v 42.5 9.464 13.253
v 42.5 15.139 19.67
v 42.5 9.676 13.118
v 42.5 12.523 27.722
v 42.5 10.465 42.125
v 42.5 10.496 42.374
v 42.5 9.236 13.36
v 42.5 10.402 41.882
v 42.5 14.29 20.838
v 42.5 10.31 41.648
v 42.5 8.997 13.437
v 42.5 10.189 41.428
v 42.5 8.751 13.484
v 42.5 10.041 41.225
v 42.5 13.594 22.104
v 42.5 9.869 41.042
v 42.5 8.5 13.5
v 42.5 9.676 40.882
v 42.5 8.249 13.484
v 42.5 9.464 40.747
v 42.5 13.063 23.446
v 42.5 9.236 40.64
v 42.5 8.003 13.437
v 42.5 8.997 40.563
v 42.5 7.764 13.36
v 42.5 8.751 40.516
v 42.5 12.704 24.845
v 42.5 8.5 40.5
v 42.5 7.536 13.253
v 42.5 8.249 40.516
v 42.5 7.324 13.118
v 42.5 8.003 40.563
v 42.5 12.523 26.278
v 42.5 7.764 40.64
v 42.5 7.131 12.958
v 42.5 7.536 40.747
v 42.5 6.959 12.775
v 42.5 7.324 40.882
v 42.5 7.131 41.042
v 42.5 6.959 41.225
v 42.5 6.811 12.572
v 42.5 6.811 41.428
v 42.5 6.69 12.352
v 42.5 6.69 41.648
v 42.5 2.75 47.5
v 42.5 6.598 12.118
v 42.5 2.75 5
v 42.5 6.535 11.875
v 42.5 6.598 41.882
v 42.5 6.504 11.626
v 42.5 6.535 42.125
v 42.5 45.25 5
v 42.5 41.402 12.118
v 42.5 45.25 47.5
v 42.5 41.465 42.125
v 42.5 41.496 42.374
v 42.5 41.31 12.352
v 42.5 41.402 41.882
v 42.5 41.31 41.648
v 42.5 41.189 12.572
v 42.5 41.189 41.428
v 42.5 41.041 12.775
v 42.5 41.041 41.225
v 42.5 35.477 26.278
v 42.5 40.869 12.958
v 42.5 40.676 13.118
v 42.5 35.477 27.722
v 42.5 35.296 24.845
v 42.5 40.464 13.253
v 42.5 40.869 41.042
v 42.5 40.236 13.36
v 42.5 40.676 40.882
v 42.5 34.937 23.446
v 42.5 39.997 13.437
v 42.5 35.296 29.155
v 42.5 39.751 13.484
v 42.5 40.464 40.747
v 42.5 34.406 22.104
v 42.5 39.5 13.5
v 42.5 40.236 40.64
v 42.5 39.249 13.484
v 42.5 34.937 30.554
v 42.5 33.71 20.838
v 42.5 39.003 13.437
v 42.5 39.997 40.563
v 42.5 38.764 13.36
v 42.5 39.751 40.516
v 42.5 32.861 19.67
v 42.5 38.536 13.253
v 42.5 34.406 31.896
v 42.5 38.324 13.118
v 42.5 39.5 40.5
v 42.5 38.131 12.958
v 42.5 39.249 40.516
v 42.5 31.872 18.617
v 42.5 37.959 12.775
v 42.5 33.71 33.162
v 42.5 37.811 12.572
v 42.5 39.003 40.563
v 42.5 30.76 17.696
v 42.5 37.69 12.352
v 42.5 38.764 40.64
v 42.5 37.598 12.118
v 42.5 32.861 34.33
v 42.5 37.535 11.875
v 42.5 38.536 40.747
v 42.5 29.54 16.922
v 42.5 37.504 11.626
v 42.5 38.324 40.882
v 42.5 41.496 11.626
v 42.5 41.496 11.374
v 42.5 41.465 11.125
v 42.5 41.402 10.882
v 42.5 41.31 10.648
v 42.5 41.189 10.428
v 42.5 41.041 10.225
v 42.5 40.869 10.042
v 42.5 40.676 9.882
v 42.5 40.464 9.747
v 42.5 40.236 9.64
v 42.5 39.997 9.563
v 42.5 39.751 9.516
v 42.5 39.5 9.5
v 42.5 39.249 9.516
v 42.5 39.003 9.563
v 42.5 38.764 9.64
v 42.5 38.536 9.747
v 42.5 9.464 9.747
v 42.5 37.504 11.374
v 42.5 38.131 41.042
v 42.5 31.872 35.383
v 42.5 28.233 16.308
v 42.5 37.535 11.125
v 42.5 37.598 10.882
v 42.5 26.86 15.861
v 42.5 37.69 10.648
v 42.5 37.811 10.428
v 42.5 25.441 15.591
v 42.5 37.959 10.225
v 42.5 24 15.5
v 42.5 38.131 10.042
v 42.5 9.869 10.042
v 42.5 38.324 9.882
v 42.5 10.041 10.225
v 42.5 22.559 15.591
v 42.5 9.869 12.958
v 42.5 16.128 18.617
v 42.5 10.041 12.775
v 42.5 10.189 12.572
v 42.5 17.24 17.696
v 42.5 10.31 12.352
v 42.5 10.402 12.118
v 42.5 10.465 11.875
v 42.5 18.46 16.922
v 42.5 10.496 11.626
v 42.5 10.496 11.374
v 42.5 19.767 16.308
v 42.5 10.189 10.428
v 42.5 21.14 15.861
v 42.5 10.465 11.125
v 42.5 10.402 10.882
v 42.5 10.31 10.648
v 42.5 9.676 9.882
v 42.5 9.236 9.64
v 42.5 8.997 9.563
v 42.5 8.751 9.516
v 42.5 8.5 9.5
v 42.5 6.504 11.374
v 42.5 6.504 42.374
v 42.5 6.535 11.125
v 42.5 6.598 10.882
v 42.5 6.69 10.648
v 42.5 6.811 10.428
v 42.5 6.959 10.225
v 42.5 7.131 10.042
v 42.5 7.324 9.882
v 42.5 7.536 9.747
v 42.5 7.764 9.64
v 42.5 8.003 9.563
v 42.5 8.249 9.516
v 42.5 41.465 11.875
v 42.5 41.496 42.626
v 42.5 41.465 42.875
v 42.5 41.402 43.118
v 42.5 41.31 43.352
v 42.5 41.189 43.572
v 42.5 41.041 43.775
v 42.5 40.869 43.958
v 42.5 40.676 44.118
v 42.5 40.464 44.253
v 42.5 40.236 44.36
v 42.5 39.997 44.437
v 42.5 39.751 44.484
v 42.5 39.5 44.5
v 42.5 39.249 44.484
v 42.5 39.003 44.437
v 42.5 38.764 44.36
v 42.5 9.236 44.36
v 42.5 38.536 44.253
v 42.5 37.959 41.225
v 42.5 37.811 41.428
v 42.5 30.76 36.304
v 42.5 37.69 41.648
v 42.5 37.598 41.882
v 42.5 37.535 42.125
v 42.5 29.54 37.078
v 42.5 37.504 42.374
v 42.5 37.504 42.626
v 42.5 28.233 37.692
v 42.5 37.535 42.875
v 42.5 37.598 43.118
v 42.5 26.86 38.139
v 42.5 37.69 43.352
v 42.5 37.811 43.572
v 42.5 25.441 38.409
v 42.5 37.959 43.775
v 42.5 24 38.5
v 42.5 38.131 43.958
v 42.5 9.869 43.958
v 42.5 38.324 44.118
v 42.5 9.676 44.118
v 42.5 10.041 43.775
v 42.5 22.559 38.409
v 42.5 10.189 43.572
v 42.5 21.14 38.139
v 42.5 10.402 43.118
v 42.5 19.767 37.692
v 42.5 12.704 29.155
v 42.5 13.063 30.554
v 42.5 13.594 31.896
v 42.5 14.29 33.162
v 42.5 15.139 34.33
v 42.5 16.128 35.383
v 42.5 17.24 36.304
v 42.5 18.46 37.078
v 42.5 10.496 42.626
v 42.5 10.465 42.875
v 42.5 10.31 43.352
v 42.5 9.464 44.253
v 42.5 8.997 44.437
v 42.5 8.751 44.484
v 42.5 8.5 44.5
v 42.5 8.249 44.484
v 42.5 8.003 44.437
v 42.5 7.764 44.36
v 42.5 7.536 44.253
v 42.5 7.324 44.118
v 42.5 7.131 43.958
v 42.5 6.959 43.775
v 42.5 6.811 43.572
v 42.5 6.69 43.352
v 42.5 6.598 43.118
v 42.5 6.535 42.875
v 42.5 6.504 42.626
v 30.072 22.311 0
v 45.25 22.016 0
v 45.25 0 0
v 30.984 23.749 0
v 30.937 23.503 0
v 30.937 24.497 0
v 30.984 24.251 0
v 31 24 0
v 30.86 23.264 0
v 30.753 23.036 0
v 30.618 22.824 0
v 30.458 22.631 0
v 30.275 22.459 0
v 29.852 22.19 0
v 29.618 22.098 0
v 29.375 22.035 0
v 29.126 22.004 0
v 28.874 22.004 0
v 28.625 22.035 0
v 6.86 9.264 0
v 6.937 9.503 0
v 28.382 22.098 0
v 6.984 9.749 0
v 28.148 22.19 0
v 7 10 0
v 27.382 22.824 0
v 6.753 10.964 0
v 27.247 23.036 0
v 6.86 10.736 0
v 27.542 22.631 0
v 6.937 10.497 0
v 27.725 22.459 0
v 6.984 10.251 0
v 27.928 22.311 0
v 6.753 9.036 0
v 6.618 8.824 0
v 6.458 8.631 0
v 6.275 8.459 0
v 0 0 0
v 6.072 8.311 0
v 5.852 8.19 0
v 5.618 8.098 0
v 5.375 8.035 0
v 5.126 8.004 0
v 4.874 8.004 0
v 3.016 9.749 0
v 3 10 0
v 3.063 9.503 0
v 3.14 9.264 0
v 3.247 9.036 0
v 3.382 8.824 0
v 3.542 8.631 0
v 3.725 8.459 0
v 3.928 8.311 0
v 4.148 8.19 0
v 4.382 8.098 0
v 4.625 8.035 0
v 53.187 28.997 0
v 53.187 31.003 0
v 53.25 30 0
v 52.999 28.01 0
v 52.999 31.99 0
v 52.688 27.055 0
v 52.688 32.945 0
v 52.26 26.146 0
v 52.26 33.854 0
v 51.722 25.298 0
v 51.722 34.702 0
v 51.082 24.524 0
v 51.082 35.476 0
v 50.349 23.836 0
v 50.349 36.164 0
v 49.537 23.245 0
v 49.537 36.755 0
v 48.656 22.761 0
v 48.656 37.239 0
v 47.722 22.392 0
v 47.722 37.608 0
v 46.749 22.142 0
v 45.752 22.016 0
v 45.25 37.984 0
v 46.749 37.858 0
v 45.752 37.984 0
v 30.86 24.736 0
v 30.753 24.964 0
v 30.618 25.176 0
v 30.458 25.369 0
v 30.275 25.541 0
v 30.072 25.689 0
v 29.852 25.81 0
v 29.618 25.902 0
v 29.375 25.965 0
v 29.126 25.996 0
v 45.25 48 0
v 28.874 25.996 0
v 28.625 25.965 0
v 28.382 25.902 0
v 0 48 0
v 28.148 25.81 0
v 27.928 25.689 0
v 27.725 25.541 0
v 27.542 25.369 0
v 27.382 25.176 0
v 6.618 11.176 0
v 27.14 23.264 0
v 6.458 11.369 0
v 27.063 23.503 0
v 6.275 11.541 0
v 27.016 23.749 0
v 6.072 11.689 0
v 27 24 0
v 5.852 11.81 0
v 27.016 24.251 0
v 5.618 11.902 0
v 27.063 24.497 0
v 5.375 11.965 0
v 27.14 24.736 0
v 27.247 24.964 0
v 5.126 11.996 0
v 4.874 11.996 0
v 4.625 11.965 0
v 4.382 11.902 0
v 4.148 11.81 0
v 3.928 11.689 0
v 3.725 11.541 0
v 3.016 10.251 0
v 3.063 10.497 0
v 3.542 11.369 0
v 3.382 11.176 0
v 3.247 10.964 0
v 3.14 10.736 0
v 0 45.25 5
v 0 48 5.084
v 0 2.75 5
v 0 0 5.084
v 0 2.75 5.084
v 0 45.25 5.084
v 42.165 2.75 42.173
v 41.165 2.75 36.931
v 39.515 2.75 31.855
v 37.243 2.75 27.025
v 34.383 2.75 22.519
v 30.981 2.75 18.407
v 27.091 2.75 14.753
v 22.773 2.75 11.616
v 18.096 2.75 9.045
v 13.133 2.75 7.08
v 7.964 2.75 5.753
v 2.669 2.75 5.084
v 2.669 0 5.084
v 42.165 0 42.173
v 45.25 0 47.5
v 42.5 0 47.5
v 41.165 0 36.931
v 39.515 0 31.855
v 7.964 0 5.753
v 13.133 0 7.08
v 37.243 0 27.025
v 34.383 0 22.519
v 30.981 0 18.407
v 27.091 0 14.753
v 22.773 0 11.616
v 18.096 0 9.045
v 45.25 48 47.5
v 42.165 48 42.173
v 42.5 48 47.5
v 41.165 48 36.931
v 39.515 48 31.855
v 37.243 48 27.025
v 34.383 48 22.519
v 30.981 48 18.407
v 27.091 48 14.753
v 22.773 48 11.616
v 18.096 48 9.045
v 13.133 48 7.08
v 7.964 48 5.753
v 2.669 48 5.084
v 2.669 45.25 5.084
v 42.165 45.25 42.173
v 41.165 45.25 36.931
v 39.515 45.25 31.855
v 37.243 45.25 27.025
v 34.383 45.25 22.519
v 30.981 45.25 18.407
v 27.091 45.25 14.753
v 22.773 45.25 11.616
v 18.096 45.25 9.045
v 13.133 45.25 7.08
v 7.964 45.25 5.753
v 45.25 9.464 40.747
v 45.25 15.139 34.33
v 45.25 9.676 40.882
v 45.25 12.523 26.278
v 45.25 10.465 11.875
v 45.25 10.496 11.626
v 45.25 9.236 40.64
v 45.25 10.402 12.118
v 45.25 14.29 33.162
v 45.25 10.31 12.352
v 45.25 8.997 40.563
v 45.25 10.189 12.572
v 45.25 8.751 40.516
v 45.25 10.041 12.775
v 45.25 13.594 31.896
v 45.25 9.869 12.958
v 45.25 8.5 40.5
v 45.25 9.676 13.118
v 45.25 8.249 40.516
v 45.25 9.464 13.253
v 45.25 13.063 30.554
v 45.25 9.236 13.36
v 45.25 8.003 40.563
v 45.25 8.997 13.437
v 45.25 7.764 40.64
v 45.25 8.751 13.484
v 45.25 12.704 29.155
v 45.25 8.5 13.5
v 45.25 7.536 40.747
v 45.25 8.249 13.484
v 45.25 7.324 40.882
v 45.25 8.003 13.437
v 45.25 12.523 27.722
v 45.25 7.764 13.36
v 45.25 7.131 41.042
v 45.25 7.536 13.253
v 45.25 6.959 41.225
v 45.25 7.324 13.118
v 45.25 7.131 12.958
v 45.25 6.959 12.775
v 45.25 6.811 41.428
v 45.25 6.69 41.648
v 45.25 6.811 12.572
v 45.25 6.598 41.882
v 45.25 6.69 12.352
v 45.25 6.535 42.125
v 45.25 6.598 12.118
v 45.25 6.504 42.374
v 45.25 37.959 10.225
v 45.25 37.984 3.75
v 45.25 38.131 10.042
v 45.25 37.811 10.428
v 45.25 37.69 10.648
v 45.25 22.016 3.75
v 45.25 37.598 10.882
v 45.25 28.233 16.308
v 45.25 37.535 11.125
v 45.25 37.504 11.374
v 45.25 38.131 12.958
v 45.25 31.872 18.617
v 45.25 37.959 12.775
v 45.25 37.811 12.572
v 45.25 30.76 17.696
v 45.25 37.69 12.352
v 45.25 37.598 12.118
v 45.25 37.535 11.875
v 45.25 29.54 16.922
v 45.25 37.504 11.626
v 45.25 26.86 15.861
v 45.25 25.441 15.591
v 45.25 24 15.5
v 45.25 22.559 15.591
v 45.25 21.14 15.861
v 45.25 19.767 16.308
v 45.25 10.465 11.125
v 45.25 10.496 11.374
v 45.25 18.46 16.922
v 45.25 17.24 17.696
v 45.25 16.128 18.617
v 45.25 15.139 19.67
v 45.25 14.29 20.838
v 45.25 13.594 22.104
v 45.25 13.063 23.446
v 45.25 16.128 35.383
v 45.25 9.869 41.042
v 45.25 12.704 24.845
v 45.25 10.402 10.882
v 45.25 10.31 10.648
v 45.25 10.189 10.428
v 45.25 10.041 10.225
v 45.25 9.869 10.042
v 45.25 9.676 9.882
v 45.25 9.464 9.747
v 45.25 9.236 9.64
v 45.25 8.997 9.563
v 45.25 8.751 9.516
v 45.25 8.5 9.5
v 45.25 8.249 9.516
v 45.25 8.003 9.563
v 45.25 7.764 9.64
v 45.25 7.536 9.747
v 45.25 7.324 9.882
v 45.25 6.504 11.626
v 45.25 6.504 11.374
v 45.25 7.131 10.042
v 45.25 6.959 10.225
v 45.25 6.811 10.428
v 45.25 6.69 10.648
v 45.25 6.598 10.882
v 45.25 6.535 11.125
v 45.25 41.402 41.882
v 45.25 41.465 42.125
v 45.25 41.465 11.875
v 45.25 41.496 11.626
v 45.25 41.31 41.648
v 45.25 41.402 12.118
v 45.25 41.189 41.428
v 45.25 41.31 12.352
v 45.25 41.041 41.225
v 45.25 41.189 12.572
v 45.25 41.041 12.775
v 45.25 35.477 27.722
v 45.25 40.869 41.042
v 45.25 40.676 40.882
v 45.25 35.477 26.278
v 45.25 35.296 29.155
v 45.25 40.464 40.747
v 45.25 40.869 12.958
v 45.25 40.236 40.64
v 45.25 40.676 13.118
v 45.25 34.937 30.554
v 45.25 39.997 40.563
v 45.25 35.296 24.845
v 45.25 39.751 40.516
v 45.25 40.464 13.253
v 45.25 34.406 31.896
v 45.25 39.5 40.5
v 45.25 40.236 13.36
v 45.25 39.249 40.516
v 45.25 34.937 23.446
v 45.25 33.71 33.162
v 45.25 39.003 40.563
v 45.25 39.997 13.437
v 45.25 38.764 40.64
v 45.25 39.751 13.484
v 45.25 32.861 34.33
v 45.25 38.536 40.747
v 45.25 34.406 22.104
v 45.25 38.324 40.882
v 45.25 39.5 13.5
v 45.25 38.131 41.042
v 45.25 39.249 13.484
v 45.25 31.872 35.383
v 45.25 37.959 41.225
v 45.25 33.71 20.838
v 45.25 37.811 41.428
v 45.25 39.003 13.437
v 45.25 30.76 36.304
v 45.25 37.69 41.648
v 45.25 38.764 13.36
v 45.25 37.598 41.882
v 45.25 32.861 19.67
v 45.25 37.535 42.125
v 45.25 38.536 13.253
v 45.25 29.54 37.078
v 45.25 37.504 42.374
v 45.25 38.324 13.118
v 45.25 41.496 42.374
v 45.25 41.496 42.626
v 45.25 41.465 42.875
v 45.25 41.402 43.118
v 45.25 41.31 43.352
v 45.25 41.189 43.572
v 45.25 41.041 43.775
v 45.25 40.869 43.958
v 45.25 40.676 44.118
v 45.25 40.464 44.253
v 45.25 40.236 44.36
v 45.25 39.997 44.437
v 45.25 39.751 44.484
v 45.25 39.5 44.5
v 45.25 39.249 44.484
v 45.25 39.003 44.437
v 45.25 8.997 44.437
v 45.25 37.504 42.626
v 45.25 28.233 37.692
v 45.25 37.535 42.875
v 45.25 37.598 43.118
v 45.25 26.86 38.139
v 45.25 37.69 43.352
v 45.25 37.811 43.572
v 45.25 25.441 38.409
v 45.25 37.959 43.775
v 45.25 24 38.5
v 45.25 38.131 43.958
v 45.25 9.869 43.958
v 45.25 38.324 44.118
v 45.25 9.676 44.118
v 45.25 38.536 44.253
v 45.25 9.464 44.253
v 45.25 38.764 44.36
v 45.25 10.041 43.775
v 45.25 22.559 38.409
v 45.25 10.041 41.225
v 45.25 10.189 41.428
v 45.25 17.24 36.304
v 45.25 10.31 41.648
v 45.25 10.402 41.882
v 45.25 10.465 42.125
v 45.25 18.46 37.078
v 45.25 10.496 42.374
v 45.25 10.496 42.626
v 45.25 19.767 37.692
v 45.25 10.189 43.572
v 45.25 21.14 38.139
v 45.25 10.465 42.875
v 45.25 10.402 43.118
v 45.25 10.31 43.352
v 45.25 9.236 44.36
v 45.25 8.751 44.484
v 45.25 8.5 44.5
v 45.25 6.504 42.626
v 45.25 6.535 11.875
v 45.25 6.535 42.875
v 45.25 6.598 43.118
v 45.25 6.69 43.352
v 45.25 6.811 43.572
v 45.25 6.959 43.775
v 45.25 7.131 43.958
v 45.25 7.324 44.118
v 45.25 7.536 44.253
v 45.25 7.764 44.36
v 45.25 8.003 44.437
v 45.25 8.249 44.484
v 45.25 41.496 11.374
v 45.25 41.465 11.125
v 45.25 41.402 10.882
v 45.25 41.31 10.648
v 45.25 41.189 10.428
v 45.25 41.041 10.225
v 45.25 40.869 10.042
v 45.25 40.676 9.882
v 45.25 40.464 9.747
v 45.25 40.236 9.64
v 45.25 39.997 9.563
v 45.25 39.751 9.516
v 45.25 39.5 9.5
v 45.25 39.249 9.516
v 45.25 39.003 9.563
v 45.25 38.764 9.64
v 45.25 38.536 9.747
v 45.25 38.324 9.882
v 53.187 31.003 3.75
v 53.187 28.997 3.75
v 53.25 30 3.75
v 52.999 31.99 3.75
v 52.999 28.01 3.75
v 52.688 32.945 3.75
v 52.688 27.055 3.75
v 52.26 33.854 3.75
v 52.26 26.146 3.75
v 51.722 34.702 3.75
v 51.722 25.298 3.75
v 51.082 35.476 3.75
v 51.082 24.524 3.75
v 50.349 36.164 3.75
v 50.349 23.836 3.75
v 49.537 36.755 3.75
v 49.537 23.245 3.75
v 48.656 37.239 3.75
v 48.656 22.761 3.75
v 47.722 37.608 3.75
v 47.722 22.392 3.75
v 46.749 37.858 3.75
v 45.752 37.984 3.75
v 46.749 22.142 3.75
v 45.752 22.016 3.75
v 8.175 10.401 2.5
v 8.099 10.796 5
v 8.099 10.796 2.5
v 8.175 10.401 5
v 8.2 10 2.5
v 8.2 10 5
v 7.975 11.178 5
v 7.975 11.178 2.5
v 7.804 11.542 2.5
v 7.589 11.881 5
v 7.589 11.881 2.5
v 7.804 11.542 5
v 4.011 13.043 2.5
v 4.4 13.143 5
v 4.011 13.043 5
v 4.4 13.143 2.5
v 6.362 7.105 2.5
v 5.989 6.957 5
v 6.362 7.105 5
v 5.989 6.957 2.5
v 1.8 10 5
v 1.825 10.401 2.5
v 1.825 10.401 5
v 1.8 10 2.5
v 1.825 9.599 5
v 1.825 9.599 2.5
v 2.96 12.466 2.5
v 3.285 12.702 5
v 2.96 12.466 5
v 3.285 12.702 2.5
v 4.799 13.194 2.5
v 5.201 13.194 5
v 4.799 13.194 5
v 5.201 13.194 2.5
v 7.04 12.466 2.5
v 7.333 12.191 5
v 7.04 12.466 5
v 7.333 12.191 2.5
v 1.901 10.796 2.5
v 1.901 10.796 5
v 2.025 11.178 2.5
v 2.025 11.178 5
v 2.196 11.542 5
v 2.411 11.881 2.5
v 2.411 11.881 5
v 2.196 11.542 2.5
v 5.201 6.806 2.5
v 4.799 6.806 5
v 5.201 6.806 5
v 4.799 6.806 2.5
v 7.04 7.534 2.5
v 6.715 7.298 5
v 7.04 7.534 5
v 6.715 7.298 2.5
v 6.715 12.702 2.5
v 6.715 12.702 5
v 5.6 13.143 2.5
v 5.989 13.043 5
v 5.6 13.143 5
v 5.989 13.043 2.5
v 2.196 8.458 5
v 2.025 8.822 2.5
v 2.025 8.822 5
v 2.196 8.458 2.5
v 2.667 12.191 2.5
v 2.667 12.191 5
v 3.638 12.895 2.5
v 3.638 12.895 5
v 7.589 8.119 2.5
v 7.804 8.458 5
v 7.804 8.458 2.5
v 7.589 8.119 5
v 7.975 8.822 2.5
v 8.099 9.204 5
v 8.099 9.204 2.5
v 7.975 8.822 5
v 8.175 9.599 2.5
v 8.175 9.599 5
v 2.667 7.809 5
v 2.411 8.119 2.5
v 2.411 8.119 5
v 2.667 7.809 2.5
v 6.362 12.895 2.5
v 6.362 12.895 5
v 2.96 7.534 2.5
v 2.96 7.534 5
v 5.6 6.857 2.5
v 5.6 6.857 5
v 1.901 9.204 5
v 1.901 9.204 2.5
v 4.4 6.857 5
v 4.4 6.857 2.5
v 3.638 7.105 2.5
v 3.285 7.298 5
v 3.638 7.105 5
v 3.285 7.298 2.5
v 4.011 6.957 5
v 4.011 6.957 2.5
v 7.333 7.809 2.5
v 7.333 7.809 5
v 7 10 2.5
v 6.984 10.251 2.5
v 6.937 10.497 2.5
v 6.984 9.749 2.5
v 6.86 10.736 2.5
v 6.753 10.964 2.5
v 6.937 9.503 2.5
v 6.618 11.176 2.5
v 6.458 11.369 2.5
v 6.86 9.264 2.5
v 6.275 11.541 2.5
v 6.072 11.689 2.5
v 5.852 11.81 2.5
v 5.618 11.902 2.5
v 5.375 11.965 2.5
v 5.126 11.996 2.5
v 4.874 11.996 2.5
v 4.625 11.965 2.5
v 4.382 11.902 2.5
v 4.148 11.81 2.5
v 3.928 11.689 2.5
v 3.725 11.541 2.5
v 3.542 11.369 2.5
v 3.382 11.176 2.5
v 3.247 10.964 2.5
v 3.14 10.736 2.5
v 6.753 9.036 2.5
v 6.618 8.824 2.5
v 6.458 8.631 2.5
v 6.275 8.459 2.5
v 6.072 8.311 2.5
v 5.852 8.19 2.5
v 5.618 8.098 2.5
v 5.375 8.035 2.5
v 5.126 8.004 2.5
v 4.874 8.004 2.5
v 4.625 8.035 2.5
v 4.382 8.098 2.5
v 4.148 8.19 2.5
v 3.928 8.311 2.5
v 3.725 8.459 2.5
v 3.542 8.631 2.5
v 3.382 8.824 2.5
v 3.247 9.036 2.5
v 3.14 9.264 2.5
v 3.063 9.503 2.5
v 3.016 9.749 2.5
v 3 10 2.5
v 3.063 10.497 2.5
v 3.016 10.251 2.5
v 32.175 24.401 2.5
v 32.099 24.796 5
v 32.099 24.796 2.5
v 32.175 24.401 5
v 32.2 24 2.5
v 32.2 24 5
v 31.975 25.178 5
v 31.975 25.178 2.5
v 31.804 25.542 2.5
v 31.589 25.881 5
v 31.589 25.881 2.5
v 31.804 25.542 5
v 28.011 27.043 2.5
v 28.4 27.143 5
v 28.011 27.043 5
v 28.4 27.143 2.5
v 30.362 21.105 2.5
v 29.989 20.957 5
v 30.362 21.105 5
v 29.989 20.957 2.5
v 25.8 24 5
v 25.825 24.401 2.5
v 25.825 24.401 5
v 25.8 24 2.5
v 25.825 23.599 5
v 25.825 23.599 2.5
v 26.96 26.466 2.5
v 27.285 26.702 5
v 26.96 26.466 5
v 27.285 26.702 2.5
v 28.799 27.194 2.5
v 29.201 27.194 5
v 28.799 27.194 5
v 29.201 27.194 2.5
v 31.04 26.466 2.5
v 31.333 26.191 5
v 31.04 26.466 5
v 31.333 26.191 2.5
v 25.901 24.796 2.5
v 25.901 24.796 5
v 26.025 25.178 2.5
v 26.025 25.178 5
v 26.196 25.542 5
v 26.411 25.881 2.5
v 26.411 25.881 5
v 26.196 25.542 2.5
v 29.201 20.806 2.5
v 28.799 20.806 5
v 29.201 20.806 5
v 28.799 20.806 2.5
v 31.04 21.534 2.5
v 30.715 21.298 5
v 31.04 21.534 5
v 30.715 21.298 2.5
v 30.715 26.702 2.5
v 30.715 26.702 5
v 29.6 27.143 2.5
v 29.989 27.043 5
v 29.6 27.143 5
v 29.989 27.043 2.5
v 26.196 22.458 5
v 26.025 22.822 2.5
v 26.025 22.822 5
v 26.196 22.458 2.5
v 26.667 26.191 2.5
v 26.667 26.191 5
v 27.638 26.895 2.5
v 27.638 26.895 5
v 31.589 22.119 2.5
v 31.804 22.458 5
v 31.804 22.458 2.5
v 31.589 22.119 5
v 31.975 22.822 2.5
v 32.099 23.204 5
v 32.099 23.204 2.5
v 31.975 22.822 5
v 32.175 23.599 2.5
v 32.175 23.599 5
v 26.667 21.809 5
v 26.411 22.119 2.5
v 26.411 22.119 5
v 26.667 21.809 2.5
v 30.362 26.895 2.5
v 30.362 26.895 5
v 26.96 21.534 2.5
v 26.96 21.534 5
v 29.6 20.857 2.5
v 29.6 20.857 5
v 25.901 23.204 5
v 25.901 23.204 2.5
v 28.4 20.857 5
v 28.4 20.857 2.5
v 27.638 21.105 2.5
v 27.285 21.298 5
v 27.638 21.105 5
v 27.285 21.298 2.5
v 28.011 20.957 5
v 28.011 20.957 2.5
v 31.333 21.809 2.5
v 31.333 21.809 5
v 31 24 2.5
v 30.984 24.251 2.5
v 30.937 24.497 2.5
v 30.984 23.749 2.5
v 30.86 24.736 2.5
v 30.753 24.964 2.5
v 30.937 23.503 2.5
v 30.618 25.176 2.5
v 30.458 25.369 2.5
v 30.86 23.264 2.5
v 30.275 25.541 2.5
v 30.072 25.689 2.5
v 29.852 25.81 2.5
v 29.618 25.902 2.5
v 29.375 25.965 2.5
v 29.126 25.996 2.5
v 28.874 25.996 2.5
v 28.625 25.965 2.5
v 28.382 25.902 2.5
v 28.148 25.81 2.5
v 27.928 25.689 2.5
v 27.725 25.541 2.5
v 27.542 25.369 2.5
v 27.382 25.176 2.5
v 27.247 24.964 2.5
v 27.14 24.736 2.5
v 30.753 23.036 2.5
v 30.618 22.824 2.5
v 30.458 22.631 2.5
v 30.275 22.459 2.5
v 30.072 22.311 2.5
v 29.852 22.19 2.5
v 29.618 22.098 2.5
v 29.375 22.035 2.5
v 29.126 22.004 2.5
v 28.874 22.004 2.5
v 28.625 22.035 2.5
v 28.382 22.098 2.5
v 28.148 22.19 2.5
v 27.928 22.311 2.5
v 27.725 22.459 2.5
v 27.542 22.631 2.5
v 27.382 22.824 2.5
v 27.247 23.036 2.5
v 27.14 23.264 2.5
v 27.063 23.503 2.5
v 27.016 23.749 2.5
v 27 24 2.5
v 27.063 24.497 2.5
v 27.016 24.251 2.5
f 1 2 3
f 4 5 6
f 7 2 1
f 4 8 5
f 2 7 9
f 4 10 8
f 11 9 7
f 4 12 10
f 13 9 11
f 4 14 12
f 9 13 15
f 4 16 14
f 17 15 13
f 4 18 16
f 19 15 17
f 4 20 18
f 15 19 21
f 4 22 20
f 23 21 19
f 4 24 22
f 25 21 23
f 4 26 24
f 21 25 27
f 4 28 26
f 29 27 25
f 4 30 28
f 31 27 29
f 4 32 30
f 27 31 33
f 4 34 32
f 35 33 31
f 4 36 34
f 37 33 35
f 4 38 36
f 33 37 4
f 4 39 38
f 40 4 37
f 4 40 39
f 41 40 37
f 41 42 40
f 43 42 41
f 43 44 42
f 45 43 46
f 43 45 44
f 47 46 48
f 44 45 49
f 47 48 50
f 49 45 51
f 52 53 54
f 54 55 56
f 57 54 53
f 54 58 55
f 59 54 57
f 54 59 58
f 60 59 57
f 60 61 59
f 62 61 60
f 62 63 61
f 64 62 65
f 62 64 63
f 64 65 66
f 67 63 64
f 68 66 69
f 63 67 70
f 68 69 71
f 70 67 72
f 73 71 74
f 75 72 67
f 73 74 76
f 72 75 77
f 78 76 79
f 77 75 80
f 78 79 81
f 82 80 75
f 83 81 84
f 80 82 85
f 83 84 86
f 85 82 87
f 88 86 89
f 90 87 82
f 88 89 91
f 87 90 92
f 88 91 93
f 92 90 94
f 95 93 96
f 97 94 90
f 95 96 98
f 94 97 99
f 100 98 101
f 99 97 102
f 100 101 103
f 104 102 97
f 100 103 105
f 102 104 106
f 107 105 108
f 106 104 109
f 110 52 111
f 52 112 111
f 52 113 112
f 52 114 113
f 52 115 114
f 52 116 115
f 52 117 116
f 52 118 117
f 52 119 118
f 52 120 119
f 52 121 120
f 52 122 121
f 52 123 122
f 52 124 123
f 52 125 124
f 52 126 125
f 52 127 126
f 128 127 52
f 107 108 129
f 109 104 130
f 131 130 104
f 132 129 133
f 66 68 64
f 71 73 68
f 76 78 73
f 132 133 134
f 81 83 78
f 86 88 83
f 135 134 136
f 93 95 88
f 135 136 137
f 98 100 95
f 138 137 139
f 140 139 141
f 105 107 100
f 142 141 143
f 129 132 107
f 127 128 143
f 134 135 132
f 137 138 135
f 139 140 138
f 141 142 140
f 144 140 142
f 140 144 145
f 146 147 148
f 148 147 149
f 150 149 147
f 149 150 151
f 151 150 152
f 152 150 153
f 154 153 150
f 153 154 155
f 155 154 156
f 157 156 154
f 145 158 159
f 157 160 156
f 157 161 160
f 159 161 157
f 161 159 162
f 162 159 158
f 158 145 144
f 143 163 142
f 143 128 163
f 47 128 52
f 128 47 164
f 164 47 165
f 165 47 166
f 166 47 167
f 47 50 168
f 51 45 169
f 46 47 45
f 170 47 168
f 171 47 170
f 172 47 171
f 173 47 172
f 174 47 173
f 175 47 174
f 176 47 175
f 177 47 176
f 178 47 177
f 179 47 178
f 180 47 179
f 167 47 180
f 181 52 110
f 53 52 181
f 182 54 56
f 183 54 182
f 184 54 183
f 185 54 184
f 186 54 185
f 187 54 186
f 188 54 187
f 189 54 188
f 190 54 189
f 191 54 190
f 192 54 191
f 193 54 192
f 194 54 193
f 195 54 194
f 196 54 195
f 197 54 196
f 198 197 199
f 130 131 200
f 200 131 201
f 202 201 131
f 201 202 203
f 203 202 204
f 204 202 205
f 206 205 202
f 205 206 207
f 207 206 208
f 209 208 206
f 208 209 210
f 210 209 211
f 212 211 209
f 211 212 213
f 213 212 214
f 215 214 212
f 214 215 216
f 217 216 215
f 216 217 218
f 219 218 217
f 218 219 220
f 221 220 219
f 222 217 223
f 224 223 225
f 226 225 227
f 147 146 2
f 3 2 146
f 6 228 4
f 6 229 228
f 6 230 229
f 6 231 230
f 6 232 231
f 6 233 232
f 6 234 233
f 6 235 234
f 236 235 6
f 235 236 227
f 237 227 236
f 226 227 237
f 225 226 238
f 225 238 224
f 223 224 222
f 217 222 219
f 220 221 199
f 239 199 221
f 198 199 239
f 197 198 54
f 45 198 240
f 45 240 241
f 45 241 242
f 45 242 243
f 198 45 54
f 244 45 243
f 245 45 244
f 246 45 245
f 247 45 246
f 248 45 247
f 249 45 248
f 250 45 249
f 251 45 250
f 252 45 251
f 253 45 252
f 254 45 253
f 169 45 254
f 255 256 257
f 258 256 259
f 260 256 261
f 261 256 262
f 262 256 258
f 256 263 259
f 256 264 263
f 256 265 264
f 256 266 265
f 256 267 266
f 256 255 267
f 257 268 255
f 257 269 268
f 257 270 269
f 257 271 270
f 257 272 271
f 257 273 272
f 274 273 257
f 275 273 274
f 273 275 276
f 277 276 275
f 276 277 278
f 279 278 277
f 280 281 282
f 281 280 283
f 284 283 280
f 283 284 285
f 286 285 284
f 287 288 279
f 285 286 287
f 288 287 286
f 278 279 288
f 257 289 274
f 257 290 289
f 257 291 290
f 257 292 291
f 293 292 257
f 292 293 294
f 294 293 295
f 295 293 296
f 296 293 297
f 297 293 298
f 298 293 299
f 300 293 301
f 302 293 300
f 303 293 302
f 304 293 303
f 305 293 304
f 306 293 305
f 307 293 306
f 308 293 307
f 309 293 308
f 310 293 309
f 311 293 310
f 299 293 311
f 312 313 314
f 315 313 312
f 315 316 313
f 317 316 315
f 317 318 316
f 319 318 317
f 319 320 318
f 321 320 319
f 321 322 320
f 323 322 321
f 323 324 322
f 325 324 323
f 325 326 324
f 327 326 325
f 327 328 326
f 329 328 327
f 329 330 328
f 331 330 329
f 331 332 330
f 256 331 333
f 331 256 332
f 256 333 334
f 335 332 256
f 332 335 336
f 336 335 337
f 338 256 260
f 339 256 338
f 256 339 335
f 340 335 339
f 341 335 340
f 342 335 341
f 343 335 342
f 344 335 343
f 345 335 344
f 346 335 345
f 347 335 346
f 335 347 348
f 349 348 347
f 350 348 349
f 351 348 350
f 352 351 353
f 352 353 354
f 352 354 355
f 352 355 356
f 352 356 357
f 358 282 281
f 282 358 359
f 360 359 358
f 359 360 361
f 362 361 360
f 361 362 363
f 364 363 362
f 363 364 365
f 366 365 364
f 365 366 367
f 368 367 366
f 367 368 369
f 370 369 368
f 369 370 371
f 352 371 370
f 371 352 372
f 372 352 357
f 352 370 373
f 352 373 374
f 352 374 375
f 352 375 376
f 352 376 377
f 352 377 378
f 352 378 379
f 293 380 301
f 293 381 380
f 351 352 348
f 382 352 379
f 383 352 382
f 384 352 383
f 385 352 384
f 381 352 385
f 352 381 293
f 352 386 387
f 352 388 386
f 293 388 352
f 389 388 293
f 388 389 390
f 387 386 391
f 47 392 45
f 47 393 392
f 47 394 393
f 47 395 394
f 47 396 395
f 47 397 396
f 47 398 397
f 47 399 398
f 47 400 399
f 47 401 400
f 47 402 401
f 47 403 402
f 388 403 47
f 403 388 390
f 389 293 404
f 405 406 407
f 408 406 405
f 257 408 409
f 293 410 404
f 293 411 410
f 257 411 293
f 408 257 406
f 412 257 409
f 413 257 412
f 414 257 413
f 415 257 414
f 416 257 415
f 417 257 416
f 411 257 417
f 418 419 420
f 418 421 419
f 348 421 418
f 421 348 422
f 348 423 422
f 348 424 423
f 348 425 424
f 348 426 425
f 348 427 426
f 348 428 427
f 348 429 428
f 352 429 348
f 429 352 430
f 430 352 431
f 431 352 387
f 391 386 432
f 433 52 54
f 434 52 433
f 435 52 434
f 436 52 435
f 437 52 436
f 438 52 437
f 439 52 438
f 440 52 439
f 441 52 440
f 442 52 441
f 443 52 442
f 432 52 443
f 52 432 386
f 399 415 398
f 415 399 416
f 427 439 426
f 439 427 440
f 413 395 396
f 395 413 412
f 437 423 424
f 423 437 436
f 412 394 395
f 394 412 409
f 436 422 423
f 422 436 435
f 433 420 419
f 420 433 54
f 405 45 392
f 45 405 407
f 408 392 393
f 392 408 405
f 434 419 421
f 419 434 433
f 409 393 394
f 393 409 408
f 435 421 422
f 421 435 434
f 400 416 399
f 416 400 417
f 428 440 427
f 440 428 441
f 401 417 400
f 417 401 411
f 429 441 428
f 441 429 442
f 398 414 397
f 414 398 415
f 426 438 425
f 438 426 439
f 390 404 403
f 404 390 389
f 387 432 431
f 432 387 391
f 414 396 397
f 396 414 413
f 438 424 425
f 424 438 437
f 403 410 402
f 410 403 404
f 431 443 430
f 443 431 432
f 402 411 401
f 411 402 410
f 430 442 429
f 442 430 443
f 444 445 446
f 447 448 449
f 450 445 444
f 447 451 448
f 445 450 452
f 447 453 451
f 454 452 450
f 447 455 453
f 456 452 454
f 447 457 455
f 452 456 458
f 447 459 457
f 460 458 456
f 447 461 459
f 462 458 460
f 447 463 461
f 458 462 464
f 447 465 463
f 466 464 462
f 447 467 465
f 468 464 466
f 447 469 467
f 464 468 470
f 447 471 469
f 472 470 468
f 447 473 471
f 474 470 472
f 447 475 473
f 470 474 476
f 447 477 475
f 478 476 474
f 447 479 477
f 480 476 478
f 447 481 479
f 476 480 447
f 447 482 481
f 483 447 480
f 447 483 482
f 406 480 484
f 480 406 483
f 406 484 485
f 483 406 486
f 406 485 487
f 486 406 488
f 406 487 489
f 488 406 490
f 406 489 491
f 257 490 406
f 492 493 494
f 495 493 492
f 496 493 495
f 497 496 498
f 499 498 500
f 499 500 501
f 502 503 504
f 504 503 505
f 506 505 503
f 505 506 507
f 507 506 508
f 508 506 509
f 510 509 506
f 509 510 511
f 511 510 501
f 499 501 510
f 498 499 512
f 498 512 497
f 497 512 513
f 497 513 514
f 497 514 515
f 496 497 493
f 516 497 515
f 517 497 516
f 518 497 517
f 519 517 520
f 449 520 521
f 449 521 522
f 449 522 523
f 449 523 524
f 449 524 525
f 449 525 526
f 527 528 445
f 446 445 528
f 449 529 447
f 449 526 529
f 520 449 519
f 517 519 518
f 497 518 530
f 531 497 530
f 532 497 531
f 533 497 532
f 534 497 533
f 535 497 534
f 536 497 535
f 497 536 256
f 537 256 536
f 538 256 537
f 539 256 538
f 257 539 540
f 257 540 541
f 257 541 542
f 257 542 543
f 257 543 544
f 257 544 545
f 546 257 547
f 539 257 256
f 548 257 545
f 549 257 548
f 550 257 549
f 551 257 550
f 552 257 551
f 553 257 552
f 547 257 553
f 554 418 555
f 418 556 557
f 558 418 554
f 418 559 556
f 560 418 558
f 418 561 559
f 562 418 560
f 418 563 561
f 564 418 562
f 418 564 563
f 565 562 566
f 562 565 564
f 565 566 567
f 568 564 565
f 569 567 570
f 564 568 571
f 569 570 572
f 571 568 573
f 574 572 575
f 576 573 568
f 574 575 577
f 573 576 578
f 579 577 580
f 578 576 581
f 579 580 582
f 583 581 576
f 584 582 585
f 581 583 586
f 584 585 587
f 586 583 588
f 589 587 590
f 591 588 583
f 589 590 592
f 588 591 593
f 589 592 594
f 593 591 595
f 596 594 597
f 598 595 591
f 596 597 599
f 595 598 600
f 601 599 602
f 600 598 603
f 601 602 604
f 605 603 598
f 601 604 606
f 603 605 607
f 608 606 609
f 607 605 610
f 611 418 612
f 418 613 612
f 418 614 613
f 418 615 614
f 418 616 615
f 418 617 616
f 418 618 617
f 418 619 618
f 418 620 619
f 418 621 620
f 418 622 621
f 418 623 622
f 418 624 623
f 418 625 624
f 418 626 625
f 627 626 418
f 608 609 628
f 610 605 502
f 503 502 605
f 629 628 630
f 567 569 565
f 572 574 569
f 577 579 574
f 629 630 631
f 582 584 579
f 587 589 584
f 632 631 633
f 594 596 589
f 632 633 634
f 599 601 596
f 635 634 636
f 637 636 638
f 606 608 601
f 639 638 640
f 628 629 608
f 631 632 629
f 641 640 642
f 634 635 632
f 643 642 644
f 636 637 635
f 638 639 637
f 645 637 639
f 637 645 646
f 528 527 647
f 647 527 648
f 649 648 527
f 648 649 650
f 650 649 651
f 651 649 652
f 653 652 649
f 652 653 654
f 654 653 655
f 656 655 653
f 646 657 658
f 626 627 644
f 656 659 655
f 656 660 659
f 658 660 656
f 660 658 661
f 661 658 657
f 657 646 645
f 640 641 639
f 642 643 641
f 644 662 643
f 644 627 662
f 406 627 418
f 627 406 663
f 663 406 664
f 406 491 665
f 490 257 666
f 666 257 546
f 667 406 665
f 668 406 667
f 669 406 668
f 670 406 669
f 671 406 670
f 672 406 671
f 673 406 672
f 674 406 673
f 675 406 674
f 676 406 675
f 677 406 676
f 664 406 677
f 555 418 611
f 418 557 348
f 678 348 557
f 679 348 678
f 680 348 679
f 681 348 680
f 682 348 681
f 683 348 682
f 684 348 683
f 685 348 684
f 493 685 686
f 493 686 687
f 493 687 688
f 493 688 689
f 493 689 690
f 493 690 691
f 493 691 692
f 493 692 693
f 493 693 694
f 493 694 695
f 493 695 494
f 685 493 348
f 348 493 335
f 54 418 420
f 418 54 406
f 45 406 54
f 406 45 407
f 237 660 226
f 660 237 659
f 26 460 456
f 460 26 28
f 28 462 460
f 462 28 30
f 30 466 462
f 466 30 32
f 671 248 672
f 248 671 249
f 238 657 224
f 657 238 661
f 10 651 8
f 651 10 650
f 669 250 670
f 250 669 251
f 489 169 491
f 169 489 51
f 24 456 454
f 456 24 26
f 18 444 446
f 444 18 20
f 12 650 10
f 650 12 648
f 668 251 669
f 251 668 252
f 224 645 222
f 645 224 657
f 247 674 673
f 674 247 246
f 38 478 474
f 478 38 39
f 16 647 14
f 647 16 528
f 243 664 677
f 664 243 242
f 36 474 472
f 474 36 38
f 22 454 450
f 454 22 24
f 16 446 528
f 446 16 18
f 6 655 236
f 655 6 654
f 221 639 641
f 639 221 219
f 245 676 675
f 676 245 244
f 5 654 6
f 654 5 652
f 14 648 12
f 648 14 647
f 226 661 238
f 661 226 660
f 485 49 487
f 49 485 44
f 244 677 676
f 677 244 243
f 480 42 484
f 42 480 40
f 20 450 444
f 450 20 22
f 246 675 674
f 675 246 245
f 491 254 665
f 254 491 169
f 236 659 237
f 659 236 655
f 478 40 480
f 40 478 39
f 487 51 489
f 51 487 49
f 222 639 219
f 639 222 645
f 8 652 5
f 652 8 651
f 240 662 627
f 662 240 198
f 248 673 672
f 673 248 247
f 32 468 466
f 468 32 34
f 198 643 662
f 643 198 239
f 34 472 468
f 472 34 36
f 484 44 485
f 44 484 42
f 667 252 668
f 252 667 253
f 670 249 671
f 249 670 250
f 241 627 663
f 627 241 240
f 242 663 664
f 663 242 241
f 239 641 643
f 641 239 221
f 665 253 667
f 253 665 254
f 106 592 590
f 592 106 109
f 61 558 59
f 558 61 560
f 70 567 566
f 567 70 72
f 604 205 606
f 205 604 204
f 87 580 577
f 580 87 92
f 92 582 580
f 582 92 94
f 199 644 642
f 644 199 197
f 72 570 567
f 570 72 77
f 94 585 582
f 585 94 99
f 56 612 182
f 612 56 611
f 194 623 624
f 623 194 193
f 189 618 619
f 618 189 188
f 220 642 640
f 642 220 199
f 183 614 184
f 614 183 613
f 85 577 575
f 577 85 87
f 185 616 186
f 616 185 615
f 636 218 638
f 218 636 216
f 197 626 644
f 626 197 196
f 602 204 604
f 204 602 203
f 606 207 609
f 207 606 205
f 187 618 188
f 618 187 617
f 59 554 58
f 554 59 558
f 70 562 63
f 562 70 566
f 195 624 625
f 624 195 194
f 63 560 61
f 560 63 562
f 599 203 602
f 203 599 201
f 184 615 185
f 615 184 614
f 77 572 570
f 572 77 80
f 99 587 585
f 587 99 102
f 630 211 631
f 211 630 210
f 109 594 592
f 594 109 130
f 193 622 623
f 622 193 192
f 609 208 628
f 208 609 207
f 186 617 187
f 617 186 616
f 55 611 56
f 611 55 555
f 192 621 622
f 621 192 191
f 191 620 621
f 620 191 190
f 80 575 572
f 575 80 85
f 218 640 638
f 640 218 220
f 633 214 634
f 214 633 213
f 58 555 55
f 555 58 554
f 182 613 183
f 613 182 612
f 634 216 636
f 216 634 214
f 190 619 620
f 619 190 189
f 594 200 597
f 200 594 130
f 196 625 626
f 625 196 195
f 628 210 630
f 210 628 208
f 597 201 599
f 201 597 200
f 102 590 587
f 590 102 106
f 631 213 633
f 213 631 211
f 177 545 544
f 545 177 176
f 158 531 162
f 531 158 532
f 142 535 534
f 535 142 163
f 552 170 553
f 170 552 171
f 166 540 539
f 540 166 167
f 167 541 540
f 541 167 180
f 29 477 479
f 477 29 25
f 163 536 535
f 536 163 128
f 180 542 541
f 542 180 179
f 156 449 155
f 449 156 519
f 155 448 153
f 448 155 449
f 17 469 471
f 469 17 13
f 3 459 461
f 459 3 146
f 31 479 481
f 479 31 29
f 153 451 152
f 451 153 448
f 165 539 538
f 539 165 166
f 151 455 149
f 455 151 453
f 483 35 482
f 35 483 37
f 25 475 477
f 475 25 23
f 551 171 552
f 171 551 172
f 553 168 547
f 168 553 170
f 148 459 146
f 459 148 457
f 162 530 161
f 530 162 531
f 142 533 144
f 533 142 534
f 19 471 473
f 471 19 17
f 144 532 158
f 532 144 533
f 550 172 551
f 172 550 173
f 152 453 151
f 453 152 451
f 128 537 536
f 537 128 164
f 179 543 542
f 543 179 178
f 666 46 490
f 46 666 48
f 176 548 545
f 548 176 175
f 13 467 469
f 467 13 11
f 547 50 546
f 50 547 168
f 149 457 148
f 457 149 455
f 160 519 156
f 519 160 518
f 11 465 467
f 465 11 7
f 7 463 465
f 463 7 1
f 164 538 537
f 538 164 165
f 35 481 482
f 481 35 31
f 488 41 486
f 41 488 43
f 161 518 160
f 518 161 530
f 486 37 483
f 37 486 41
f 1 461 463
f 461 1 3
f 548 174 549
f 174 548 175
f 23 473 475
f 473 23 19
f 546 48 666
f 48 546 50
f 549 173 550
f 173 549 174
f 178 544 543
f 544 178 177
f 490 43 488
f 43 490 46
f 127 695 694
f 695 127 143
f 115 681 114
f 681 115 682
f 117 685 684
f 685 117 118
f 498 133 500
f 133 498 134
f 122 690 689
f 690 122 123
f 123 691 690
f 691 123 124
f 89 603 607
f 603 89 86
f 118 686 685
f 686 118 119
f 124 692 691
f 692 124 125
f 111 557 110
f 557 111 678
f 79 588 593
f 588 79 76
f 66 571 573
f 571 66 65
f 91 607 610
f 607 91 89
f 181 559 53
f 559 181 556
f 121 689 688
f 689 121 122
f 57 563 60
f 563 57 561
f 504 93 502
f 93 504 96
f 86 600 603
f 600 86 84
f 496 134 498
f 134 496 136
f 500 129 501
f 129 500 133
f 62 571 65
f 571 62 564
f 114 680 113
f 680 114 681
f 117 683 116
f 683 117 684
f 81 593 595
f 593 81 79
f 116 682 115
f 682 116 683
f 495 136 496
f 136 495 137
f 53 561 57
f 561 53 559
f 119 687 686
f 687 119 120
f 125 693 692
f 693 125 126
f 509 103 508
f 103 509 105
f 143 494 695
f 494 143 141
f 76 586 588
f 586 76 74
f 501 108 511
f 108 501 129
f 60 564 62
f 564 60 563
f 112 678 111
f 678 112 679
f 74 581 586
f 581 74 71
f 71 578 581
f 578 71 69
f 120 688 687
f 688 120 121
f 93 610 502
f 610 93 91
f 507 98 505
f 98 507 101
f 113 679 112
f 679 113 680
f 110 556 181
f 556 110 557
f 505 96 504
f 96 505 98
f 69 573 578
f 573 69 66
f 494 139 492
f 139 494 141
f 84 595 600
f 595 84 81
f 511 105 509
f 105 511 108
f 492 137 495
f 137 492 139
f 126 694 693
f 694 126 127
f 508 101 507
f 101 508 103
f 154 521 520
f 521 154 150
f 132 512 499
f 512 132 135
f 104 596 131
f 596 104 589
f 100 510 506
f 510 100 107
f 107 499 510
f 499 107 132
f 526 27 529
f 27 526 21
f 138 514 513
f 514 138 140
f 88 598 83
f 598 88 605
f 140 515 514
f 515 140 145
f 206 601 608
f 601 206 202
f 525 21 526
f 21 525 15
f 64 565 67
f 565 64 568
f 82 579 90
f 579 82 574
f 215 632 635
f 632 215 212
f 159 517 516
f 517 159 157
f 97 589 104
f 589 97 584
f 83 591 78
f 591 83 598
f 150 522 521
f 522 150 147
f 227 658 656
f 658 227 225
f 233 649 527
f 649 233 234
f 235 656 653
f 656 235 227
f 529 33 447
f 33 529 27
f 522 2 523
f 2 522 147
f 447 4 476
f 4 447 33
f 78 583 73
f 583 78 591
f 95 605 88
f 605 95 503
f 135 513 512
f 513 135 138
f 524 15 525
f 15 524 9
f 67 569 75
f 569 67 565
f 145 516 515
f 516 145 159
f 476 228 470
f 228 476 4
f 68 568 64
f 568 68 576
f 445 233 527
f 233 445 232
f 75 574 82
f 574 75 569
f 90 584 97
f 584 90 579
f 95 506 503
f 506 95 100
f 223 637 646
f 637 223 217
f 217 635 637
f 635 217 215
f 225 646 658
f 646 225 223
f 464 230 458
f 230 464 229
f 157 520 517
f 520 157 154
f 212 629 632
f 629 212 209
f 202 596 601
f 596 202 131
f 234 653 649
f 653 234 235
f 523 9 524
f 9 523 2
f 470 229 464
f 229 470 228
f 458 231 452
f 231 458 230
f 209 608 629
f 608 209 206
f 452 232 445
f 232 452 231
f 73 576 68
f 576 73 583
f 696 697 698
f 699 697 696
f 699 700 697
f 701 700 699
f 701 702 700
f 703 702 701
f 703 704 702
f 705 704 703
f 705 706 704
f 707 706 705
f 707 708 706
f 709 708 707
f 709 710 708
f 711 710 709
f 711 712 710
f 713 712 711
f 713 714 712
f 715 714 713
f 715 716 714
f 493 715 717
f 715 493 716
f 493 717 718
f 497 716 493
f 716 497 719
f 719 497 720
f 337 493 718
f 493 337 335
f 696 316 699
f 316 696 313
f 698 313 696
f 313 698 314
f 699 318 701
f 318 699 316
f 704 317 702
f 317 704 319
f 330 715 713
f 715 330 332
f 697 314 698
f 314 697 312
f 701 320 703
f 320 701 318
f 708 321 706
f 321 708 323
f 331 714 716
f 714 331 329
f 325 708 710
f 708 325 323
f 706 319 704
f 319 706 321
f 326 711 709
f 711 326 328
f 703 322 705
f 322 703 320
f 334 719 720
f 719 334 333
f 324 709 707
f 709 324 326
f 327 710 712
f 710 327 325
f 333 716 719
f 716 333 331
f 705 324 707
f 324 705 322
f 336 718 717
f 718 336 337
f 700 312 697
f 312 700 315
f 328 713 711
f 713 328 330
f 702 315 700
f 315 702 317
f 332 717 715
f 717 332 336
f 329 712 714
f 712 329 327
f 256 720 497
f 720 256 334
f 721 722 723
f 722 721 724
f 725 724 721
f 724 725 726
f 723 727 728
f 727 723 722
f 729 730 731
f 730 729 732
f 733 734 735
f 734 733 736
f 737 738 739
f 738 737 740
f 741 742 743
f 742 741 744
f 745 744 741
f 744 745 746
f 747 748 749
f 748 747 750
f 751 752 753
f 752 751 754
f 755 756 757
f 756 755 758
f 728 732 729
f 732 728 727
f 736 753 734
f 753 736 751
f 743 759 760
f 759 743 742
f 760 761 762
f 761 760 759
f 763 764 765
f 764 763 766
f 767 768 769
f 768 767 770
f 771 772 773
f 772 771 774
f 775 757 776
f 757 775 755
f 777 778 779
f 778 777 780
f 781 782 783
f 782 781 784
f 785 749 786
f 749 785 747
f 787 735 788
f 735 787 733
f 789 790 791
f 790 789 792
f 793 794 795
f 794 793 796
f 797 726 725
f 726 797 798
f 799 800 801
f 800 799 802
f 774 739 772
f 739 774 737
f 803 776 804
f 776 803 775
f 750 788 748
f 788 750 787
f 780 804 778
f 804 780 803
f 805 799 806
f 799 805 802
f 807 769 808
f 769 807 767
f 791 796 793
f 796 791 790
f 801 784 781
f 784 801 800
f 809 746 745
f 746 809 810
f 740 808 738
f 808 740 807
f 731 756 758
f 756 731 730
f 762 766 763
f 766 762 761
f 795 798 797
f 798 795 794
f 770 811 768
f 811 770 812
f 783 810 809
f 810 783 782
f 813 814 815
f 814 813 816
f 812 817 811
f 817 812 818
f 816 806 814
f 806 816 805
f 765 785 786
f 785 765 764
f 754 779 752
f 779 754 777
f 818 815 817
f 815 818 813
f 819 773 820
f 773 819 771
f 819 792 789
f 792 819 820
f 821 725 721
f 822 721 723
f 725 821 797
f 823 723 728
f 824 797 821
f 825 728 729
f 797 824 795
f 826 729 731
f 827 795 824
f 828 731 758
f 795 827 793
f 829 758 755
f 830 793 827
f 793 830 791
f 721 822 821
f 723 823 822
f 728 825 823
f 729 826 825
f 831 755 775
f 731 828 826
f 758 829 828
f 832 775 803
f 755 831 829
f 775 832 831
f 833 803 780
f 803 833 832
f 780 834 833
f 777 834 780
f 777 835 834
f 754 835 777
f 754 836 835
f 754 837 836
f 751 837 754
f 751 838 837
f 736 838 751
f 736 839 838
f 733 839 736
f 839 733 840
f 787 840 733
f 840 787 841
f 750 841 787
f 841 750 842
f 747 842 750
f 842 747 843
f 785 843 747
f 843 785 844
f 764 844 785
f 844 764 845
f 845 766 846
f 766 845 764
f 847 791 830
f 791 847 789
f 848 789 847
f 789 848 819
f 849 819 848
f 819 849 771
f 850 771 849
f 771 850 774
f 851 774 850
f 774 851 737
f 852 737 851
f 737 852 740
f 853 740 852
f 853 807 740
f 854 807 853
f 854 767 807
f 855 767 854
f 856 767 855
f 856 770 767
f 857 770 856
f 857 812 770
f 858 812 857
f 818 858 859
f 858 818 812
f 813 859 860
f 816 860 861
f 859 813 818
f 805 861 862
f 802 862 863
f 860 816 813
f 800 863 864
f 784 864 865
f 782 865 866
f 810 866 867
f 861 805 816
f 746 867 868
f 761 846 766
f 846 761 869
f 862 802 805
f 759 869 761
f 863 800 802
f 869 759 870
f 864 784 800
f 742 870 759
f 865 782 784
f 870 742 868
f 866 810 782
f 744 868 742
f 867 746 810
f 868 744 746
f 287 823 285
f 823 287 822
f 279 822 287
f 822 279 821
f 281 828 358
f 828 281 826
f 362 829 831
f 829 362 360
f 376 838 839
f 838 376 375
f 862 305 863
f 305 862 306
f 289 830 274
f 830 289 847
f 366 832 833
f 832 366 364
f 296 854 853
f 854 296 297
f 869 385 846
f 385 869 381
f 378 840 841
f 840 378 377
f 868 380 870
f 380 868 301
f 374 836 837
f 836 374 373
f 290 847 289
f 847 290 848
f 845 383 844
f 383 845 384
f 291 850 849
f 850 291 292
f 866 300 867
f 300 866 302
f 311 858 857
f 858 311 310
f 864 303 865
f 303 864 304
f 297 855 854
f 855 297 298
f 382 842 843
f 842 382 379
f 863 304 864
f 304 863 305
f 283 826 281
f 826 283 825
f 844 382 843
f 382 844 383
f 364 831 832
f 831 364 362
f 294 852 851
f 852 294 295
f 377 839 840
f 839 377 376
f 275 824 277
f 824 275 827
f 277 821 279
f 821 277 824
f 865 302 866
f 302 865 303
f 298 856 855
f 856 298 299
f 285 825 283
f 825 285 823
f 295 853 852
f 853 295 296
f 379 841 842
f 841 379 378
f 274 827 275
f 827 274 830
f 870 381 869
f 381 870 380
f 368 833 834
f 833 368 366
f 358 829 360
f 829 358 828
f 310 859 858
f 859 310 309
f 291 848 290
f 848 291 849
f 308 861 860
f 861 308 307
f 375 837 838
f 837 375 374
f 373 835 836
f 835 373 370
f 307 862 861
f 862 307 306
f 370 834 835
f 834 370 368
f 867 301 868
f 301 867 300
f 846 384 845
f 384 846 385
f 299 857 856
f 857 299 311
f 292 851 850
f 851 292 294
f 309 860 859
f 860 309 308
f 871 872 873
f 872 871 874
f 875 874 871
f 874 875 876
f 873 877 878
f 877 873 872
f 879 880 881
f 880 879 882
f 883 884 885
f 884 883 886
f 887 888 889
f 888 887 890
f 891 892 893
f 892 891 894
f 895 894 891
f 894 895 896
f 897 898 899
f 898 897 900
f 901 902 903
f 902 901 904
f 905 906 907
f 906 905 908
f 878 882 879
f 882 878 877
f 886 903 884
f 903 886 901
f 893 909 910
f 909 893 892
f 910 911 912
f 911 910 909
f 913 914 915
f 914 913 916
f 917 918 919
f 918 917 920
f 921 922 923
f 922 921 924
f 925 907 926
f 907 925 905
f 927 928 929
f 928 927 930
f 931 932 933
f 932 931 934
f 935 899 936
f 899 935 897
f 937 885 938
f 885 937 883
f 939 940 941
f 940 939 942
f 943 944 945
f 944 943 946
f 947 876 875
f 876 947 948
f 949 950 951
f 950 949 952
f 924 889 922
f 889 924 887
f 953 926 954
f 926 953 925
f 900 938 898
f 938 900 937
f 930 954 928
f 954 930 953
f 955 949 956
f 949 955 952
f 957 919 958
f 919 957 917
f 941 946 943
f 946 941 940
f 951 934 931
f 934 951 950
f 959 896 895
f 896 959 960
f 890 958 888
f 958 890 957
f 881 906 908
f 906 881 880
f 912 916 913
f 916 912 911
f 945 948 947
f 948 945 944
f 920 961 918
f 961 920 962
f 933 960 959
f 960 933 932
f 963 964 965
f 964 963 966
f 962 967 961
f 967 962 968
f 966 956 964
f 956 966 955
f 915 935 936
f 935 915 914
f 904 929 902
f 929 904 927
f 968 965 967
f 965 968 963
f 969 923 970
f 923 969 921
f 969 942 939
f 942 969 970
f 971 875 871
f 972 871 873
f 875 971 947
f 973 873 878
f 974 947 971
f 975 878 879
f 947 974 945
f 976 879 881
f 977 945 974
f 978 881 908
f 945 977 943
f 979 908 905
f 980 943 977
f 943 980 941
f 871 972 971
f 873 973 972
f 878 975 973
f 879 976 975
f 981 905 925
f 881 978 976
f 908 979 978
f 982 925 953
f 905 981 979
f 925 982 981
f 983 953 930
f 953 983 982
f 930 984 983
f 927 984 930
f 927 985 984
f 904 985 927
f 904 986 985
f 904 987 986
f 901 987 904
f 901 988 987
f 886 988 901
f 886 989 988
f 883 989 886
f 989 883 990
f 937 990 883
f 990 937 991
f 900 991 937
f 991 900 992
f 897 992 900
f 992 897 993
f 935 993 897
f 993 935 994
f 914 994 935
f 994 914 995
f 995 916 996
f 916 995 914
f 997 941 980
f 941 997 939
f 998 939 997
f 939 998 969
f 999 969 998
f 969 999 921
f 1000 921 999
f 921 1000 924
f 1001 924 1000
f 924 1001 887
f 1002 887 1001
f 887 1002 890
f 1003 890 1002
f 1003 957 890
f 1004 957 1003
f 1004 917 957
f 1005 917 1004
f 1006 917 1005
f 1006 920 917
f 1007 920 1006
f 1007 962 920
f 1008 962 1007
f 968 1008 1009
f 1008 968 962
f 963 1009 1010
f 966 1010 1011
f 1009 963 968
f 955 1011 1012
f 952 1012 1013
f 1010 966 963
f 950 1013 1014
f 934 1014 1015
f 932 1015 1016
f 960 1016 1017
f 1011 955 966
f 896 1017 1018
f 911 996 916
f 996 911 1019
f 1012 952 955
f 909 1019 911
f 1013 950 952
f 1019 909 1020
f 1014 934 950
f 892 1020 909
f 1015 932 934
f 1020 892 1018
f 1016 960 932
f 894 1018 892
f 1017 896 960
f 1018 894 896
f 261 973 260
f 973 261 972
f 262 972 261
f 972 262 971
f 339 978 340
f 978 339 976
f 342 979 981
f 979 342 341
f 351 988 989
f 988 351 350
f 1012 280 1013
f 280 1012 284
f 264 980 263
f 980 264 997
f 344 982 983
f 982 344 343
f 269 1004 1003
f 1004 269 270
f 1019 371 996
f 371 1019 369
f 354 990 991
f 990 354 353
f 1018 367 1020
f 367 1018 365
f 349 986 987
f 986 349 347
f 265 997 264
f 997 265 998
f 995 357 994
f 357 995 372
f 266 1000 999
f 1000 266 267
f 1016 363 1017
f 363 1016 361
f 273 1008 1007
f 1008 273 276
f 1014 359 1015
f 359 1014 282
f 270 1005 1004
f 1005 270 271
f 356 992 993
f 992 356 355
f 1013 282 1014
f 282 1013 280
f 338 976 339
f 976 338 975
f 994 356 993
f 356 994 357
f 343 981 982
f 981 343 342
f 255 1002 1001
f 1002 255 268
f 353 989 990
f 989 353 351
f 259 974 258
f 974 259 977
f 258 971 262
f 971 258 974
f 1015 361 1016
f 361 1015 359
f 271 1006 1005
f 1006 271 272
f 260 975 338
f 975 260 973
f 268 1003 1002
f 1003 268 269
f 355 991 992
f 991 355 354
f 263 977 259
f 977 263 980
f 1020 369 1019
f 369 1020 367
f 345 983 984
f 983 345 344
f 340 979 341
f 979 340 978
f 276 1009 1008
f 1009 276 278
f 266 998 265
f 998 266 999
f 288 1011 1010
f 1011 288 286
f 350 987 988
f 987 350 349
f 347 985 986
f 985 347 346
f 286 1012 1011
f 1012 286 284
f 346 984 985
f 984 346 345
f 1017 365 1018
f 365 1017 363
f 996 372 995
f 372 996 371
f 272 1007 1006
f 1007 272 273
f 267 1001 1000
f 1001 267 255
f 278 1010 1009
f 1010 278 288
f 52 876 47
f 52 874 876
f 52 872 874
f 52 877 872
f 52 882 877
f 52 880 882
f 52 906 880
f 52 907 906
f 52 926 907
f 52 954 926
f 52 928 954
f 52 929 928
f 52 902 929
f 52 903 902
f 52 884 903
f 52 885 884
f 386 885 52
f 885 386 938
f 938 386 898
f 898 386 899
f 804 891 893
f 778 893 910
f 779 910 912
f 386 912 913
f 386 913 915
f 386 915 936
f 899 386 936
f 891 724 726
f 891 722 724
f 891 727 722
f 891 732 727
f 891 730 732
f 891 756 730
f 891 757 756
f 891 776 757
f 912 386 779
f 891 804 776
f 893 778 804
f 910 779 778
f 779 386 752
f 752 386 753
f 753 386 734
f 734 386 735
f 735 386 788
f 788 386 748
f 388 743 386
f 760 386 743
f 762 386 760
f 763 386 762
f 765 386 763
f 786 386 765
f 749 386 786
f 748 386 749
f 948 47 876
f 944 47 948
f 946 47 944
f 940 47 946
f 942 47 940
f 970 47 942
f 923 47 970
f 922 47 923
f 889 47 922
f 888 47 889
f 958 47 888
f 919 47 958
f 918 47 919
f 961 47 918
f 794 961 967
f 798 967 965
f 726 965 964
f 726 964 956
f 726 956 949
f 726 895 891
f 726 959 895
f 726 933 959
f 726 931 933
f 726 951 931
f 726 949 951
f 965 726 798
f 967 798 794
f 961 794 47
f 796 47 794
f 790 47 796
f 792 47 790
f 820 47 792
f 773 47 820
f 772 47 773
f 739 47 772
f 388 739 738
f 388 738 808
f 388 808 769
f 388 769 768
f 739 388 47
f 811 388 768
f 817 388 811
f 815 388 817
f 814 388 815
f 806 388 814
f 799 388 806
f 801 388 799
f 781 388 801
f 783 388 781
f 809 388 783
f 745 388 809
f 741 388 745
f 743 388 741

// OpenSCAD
// smoother circles
$fn = 50;

// height of the base
base_h = 5;

// radius of the small screw holes in the base and the wall (m3)
small_hole_d = 2;

// radius of the hole in the base for the head of the screw (m3)
big_hole_d = 3.2;

// width and length of the empty space for the nema motor.
// 42.5 is a snug fit.
base_size = 42.5;

// width of the vertical walls. Adjust according to the length of the screws you plan to use to tighten the nema motor in place.
vert_wall_w = 2.75;

// distance between the holes of the screws holding the motor
nema_holes_dist = 31;

// hole for the motor axle
nema_big_hole = 11.5;

vert_wall_l = base_size + 2*vert_wall_w;
vert_wall_h = base_size + base_h;

difference() {
    union() {
        cube([base_size, vert_wall_w, base_size + base_h]);
        
        translate([0, vert_wall_l - vert_wall_w, 0])
        cube([base_size, vert_wall_w, base_size + base_h]);
    }
 
    translate([0, -0.1, base_size + base_h])
    rotate( [-90, 0, 0] ) 
    cylinder( h = vert_wall_l + 0.2, r = base_size );   

}

module vertical_hole(r) {
    rotate( [0, 90, 0] ) 
            cylinder( h = vert_wall_w +0.2, r = r );
}

translate([base_size, 0, 0]) {
    difference() {
        cube( [ vert_wall_w, vert_wall_l, vert_wall_h ]) ;
        
        translate([-0.1, vert_wall_l/2 - nema_holes_dist/2, vert_wall_h - 5])
            vertical_hole(small_hole_d);
        
        translate([-0.1, vert_wall_l/2 + nema_holes_dist/2, vert_wall_h - 5])
            vertical_hole(small_hole_d);
        
        translate([-0.1, vert_wall_l/2 - nema_holes_dist/2, vert_wall_h - 5 - nema_holes_dist ])
            vertical_hole(small_hole_d);
        
        translate([-0.1, vert_wall_l/2 + nema_holes_dist/2, vert_wall_h - 5 - nema_holes_dist ])
            vertical_hole(small_hole_d);
        
        translate([-0.1, vert_wall_l/2, vert_wall_h - 5 - nema_holes_dist/2 ])
            vertical_hole(nema_big_hole);
    }
}

translate([ 42.5 + 2.75, 30, 0])
union() {
    //add missing material between z axis cover and base
    translate([-(42.5 + 2.75 - base_size), -8, 0])
        cube([42.5 + 2.75 - base_size, 16, 0.75 * base_h ]);
    cylinder( h = 0.75 * base_h, r = 8);
}

module base_hole() {
    union() {
        translate([0, 0 , base_h - 2.5])
            cylinder( h = base_h - 2.5 + 0.1, r = big_hole_d );
        translate([0, 0 , -0.1])
            cylinder( h = base_h + 0.2, r = small_hole_d );
    }
}

// base
difference() {
    cube([base_size , vert_wall_l, base_h]);
    
    hole_diff_y = 14;
    hole_diff_x = 24;
    
    first_x = 5;
    first_y = 7.25 + vert_wall_w;
    
    translate([first_x, first_y, 0])
        base_hole();
    
    translate([first_x + hole_diff_x, first_y + hole_diff_y, 0])
        base_hole();
}
